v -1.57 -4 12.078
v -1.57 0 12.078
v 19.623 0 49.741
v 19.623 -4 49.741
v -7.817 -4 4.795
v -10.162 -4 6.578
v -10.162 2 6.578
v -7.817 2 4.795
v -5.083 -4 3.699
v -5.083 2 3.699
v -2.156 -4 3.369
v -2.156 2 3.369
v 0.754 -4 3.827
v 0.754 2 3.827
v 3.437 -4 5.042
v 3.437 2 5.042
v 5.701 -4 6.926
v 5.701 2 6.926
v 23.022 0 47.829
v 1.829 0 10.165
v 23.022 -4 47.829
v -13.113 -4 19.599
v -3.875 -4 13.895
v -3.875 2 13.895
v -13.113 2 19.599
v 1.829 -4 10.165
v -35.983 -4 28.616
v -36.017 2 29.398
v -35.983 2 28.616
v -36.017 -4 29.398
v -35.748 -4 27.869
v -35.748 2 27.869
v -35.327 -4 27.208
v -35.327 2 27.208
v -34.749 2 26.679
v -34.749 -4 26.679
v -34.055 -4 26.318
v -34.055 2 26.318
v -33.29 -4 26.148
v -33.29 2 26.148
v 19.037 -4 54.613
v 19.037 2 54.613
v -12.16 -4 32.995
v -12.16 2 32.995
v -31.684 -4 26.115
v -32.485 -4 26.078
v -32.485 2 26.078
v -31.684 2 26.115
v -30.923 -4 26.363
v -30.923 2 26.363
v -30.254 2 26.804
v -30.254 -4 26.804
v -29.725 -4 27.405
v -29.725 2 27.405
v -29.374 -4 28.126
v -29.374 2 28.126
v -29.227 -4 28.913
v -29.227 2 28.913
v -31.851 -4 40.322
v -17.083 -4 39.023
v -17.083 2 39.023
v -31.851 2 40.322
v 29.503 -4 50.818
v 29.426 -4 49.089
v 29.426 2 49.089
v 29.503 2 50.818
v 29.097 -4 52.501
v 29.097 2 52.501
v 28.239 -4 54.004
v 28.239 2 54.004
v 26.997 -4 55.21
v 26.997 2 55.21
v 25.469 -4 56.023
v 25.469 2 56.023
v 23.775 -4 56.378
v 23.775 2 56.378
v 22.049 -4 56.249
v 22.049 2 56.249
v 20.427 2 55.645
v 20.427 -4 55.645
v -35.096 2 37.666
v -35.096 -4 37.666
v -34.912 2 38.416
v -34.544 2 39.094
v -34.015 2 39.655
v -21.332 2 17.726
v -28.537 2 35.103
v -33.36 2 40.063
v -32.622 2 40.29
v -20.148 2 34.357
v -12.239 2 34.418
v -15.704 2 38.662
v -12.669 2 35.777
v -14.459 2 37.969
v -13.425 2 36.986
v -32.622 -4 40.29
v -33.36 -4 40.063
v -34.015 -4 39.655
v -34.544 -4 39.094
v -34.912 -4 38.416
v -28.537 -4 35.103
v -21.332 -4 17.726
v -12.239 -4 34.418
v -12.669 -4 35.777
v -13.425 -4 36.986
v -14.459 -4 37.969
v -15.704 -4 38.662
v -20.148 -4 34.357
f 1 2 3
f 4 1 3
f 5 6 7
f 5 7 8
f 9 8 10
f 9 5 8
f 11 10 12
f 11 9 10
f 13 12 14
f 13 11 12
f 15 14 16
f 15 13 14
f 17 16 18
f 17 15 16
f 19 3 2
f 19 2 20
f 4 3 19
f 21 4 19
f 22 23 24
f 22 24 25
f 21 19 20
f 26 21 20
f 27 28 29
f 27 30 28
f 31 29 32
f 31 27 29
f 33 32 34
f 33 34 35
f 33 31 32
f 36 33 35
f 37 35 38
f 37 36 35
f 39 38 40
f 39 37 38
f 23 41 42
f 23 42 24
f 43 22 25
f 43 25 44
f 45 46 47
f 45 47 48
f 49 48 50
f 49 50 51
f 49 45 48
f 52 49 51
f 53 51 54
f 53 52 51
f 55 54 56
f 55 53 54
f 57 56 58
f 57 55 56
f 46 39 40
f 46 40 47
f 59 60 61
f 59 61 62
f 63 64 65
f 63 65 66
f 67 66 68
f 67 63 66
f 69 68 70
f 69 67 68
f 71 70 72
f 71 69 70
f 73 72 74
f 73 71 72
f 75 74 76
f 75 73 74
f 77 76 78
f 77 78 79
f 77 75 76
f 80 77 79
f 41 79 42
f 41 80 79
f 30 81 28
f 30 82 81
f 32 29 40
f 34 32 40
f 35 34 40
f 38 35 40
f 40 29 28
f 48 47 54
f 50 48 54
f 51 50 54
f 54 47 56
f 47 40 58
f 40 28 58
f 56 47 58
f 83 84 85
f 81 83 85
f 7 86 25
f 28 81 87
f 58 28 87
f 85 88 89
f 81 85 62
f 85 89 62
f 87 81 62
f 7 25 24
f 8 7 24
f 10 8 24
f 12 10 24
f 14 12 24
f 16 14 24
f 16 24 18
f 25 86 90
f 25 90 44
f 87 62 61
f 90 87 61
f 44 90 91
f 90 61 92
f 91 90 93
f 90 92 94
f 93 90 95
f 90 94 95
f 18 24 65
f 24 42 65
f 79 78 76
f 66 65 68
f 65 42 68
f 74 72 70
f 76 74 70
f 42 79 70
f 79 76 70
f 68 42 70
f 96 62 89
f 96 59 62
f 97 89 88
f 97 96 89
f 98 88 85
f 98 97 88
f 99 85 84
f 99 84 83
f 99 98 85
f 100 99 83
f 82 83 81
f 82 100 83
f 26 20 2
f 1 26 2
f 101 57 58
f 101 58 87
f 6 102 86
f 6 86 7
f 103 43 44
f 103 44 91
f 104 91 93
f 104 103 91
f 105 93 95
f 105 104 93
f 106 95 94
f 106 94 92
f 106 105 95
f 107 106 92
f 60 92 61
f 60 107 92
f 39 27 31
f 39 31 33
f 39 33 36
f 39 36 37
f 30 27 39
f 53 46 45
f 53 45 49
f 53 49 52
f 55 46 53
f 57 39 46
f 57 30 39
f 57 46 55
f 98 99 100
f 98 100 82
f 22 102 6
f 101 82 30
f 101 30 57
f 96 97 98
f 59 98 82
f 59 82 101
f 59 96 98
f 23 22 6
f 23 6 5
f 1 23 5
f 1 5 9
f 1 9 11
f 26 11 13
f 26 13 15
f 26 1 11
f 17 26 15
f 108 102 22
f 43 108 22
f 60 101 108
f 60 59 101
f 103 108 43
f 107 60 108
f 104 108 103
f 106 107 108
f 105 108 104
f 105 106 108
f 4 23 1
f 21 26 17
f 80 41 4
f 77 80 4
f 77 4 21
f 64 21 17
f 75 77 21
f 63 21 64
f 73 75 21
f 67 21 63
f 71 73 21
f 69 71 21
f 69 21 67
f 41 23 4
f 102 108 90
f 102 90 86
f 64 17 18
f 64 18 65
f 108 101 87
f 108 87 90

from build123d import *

# Parameters (mm, degrees)
F1_DEPTH = 4
F2_DEPTH = 2


with BuildPart() as f1:
    # F0 (on Front) → F1 (new body)
    with BuildSketch(Plane.XZ):
        with BuildLine():
            ThreePointArc((-36.017278, 29.398246), (-35.326827, 27.208416), (-33.290161, 26.148194))
            Line((-33.290161, 26.148194), (-32.484752, 26.07773))
            ThreePointArc((-32.484752, 26.07773), (-30.253575, 26.803519), (-29.227186, 28.913363))
            Line((-29.227186, 28.913363), (-28.537242, 35.103315))
            Line((-28.537242, 35.103315), (-20.148152, 34.356556))
            Line((-20.148152, 34.356556), (-21.33208, 17.72593))
            Line((-21.33208, 17.72593), (-10.161562, 6.577645))
            ThreePointArc((-10.161562, 6.577645), (-2.155933, 3.368806), (5.701012, 6.926216))
            Line((5.701012, 6.926216), (29.425626, 49.089231))
            ThreePointArc((29.425626, 49.089231), (26.2619, 55.67029), (19.036789, 54.613281))
            Line((19.036789, 54.613281), (-3.875086, 13.894653))
            Line((-3.875086, 13.894653), (-13.112814, 19.599447))
            Line((-13.112814, 19.599447), (-12.160234, 32.994758))
            ThreePointArc((-12.160234, 32.994758), (-13.425174, 36.986259), (-17.083313, 39.023455))
            Line((-17.083313, 39.023455), (-31.851361, 40.322261))
            ThreePointArc((-31.851361, 40.322261), (-34.014612, 39.655086), (-35.095724, 37.666124))
            Line((-35.095724, 37.666124), (-36.017278, 29.398246))
        make_face()
        Polygon((23.022137, 47.828823), (1.829196, 10.165058), (-1.569676, 12.077562), (19.623265, 49.741327), align=None, mode=Mode.SUBTRACT)
    extrude(amount=F1_DEPTH)

    # F0 (on Front) → F2 (join)
    with BuildSketch(Plane.XZ):
        with BuildLine():
            ThreePointArc((-36.017278, 29.398246), (-35.326827, 27.208416), (-33.290161, 26.148194))
            Line((-33.290161, 26.148194), (-32.484752, 26.07773))
            ThreePointArc((-32.484752, 26.07773), (-30.253575, 26.803519), (-29.227186, 28.913363))
            Line((-29.227186, 28.913363), (-28.537242, 35.103315))
            Line((-28.537242, 35.103315), (-20.148152, 34.356556))
            Line((-20.148152, 34.356556), (-21.33208, 17.72593))
            Line((-21.33208, 17.72593), (-10.161562, 6.577645))
            ThreePointArc((-10.161562, 6.577645), (-2.155933, 3.368806), (5.701012, 6.926216))
            Line((5.701012, 6.926216), (29.425626, 49.089231))
            ThreePointArc((29.425626, 49.089231), (26.2619, 55.67029), (19.036789, 54.613281))
            Line((19.036789, 54.613281), (-3.875086, 13.894653))
            Line((-3.875086, 13.894653), (-13.112814, 19.599447))
            Line((-13.112814, 19.599447), (-12.160234, 32.994758))
            ThreePointArc((-12.160234, 32.994758), (-13.425174, 36.986259), (-17.083313, 39.023455))
            Line((-17.083313, 39.023455), (-31.851361, 40.322261))
            ThreePointArc((-31.851361, 40.322261), (-34.014612, 39.655086), (-35.095724, 37.666124))
            Line((-35.095724, 37.666124), (-36.017278, 29.398246))
        make_face()
        Polygon((23.022137, 47.828823), (1.829196, 10.165058), (-1.569676, 12.077562), (19.623265, 49.741327), align=None, mode=Mode.SUBTRACT)
        Polygon((-1.569676, 12.077562), (1.829196, 10.165058), (23.022137, 47.828823), (19.623265, 49.741327), align=None)
    extrude(amount=-F2_DEPTH)


solid = f1.part
